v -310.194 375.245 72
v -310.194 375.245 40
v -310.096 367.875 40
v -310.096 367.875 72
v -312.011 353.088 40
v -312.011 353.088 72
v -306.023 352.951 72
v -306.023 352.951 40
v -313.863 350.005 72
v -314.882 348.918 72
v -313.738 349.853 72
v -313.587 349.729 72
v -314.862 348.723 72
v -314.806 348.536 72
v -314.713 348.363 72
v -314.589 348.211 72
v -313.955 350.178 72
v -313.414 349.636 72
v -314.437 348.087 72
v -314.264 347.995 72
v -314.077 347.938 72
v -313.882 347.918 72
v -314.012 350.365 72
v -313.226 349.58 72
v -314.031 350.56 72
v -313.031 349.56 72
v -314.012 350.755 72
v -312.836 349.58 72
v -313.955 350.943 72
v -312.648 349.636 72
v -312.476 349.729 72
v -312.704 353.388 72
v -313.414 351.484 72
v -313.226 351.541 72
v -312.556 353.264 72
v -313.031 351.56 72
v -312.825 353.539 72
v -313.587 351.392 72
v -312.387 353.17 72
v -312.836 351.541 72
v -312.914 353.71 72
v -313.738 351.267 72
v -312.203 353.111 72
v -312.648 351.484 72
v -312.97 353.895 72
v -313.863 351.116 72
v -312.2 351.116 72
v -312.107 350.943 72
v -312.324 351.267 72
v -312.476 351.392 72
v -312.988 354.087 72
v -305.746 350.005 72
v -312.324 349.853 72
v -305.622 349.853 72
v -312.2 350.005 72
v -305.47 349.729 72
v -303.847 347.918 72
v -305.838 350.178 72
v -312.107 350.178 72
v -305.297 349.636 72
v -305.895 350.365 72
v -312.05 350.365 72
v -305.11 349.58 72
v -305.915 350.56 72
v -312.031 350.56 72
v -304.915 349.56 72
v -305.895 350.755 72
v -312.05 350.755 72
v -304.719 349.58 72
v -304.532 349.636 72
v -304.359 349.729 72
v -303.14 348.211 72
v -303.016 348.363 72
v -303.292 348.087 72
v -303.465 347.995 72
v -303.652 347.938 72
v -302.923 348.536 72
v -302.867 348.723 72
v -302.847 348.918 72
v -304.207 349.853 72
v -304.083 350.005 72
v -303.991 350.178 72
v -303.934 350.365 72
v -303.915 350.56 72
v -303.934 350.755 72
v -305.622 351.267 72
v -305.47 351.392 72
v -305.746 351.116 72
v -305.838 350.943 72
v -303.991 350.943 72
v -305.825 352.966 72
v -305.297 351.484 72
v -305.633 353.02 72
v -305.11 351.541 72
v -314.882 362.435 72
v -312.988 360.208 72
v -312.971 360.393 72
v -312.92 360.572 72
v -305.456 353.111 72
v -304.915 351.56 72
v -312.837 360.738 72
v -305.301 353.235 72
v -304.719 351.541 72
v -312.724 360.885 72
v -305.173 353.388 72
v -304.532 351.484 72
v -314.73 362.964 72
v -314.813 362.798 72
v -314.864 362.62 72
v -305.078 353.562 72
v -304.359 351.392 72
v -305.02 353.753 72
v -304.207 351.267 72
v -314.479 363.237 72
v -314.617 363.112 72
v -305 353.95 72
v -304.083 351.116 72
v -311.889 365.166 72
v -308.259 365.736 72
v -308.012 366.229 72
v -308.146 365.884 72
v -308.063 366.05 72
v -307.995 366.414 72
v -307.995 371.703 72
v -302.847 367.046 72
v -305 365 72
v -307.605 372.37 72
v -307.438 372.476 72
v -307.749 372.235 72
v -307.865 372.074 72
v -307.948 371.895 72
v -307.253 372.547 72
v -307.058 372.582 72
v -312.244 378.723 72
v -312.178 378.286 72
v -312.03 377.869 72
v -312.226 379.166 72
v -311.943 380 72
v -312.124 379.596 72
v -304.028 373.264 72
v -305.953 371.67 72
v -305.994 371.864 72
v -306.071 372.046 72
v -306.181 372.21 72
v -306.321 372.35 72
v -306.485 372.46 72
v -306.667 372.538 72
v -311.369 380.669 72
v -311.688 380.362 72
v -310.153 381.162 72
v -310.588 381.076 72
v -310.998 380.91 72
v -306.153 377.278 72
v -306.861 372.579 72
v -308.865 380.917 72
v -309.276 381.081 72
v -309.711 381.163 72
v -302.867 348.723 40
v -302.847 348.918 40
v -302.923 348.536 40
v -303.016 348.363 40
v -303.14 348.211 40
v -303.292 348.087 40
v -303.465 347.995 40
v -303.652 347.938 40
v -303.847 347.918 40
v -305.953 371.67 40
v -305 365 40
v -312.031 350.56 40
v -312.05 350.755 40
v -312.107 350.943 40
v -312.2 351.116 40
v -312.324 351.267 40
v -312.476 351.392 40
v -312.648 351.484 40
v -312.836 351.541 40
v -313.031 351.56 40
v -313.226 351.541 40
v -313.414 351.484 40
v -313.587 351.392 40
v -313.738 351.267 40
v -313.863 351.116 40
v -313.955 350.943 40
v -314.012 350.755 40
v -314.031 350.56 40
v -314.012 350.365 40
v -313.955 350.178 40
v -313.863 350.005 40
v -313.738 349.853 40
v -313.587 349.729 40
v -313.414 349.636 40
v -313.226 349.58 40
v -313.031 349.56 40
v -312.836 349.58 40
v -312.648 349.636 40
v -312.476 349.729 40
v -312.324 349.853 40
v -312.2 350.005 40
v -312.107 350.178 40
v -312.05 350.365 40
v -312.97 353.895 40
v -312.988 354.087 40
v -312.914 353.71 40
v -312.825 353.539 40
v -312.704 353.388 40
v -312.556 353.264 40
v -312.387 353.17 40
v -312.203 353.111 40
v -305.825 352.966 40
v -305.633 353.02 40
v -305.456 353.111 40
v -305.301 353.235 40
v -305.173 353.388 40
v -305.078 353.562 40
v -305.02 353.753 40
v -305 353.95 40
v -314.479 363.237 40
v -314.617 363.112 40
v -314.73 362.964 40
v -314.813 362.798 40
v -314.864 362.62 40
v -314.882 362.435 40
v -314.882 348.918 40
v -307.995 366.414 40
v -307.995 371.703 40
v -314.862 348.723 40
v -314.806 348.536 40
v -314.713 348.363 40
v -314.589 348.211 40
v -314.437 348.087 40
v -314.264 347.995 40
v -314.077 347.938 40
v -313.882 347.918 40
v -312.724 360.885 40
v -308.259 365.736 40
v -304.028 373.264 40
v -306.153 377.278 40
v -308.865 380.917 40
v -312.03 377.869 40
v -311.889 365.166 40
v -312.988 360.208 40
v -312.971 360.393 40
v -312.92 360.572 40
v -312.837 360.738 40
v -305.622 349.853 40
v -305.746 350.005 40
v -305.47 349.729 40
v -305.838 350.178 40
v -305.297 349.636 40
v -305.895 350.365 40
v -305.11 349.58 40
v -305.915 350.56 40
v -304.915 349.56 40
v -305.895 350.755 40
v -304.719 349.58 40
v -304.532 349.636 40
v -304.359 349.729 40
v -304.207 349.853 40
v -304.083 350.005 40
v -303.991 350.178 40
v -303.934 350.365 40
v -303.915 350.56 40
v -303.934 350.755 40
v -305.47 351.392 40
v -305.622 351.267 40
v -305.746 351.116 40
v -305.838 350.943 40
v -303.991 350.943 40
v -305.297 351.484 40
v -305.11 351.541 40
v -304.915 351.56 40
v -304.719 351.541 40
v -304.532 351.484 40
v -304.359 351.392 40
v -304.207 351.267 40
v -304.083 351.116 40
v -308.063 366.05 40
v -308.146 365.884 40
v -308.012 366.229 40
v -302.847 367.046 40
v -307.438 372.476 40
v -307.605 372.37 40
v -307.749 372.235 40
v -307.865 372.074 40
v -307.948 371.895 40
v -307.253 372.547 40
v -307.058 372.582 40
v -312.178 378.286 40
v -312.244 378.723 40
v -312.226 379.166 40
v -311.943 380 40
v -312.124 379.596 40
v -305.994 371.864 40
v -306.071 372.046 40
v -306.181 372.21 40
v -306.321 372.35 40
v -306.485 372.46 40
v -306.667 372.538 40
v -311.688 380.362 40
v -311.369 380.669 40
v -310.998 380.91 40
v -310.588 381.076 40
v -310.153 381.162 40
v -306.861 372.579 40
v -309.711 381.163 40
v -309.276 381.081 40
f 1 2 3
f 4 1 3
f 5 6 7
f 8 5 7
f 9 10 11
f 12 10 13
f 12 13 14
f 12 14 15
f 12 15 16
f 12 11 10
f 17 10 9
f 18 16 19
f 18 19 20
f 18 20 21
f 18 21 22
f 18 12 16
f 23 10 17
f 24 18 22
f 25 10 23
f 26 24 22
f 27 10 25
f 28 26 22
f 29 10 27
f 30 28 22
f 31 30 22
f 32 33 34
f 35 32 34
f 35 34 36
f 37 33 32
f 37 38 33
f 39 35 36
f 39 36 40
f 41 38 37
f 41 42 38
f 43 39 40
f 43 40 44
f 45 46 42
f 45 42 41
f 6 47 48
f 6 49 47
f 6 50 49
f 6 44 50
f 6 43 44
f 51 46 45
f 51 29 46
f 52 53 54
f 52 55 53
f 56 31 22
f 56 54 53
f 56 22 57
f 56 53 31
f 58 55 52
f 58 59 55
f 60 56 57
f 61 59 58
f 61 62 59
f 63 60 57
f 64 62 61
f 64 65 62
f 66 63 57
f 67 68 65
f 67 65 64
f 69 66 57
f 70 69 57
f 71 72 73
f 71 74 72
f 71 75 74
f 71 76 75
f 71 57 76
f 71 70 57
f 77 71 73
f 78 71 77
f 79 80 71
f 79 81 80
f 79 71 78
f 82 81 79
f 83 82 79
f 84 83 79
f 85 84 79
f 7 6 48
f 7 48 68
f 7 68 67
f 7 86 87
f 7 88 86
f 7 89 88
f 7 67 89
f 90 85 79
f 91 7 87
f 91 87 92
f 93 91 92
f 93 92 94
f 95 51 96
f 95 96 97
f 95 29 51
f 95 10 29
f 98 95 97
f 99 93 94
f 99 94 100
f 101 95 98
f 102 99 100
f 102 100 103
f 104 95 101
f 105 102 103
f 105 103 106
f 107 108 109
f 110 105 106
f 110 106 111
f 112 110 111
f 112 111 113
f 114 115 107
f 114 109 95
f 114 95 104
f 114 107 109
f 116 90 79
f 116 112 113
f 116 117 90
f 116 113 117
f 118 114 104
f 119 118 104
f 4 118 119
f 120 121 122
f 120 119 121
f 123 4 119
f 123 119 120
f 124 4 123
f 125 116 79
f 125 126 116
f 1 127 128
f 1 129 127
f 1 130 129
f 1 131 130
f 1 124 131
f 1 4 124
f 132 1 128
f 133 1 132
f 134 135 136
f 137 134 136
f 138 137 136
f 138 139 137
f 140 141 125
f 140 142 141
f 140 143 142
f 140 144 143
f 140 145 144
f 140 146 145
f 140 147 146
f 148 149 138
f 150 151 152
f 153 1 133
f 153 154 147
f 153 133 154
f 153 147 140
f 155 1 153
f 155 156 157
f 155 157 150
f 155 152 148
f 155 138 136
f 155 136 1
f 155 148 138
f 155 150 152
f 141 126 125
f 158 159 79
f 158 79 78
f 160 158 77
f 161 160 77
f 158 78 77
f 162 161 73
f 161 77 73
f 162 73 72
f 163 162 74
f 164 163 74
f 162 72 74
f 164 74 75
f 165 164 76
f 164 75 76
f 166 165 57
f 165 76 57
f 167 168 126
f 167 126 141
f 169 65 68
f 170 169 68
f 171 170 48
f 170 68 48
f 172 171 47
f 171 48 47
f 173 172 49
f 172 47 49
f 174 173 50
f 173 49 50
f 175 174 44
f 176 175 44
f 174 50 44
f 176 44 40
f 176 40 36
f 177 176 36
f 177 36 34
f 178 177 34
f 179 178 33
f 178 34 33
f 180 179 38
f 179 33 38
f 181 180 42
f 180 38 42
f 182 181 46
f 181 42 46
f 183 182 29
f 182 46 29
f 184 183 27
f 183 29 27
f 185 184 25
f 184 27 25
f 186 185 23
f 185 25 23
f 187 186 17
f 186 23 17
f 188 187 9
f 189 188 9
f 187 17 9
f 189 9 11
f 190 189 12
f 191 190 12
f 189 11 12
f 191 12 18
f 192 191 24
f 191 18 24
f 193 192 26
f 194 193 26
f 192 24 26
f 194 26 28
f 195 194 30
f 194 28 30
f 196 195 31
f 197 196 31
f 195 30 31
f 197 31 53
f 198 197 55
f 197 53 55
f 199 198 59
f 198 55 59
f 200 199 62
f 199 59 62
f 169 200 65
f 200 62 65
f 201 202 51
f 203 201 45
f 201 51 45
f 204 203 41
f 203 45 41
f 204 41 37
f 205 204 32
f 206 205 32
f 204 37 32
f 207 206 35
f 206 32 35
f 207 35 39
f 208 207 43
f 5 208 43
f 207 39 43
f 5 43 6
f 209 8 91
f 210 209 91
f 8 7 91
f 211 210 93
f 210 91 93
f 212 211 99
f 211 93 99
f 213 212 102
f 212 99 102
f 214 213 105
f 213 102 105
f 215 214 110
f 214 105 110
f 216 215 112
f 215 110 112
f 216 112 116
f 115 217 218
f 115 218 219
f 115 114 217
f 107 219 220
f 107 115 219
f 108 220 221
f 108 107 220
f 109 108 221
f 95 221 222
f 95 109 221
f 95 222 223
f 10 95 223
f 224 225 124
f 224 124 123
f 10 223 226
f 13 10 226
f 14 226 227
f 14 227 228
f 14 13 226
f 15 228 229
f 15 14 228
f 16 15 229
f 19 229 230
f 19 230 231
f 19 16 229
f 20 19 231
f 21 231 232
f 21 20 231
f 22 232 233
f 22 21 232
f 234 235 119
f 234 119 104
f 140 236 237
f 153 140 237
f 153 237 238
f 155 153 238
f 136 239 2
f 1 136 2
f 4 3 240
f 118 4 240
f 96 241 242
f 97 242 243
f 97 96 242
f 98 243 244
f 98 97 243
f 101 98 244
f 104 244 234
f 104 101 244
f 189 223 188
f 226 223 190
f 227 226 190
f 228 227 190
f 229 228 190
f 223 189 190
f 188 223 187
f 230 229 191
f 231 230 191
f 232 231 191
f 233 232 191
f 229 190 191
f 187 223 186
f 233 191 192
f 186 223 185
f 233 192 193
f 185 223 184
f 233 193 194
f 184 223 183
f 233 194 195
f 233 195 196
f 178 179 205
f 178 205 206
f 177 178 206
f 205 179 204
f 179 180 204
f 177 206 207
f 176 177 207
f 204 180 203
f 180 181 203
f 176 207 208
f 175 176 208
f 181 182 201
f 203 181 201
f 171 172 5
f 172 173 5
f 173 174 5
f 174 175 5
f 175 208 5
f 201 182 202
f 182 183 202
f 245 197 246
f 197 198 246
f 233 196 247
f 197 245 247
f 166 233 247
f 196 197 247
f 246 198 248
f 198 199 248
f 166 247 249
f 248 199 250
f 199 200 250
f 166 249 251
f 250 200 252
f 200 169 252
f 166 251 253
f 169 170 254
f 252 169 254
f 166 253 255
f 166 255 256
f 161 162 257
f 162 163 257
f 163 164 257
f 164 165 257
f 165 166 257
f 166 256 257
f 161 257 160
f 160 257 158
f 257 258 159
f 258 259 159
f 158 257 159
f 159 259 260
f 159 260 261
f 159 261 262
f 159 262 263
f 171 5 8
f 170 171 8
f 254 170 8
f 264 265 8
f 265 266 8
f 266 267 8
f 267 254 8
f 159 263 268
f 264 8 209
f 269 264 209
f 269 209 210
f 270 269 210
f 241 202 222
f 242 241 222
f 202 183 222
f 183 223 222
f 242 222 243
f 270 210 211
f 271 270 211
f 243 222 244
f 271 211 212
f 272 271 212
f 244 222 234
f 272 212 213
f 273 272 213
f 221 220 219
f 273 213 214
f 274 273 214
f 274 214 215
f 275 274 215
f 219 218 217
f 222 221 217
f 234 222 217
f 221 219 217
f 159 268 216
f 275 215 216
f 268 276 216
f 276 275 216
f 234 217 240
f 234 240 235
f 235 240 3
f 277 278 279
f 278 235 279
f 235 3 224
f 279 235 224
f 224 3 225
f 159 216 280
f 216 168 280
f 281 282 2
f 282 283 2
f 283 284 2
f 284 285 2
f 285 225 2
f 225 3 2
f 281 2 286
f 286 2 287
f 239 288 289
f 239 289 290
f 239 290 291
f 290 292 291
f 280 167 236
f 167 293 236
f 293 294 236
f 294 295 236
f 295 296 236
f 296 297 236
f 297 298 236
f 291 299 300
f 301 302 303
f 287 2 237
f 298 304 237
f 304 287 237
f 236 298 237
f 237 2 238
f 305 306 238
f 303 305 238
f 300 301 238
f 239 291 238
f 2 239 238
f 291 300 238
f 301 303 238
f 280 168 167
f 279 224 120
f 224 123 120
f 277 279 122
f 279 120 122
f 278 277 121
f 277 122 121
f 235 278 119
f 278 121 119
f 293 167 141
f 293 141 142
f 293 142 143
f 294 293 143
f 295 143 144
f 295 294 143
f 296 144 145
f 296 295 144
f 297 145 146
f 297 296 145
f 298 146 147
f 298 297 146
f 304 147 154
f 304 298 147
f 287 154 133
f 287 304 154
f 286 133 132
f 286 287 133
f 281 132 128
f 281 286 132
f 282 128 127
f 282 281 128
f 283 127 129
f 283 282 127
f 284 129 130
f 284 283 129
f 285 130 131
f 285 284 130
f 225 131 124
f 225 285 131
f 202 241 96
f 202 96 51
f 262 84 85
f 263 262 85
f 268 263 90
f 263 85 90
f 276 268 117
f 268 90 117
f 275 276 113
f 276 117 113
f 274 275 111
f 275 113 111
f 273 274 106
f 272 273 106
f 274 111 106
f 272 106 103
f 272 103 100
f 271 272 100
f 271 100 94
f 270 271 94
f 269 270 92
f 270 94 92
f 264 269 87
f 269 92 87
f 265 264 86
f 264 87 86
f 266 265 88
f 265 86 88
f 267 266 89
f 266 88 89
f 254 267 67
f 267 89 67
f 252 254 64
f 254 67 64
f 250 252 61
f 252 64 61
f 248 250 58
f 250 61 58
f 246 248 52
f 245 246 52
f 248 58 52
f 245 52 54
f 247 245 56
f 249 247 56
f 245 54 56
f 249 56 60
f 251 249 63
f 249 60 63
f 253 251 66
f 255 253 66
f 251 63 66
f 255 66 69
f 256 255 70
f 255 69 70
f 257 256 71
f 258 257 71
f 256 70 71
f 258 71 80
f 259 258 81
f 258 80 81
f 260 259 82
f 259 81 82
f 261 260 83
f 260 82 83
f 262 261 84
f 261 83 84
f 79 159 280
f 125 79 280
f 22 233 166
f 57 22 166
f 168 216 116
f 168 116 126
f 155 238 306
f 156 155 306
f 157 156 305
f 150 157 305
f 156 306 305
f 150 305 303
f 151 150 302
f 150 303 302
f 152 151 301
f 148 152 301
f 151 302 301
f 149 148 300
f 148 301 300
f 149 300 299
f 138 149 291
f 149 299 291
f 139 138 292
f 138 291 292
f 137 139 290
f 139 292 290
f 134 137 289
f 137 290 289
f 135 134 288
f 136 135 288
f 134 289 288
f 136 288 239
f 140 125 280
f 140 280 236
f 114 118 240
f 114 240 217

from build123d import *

# Parameters (mm, degrees)
BOSS_EXTRUDE1_DEPTH = 32
FILLET1_R           = 1
SKETCH2_R           = 1
CUT_EXTRUDE1_DEPTH  = 32


with BuildPart() as part:
    # Sketch1 → Boss-Extrude1 (new body)
    with BuildSketch(Plane.XY.offset(40)):
        with BuildLine():
            Line((-312.030492528, 377.868524993), (-310.193868717, 375.244776692))
            Line((-310.193868717, 375.244776692), (-310.096008301, 367.875213623))
            Line((-310.096008301, 367.875213623), (-311.889068604, 365.166412354))
            Line((-311.889068604, 365.166412354), (-314.88168335, 362.936676025))
            Line((-314.88168335, 362.936676025), (-314.88168335, 347.918438133))
            Line((-314.88168335, 347.918438133), (-302.847373473, 347.918438133))
            Line((-302.847373473, 347.918438133), (-302.847373473, 367.04556325))
            Line((-302.847373473, 367.04556325), (-304.028060208, 373.263846724))
            Line((-304.028060208, 373.263846724), (-306.153296332, 377.278181625))
            Line((-306.153296332, 377.278181625), (-308.864528411, 380.917030307))
            ThreePointArc((-308.864528411, 380.917030307), (-311.535911341, 380.523114569), (-312.030492528, 377.868524993))
        make_face()
        with BuildLine():
            Line((-312.988408734, 360.598376943), (-312.988408734, 353.109979303))
            Line((-312.988408734, 353.109979303), (-305, 352.927314193))
            Line((-305, 352.927314193), (-305, 365))
            Line((-305, 365), (-305.952850342, 371.670013428))
            ThreePointArc((-305.952850342, 371.670013428), (-306.959348498, 372.584855641), (-307.99460106, 371.702683918))
            Line((-307.99460106, 371.702683918), (-307.99460106, 366.023339102))
            Line((-307.99460106, 366.023339102), (-312.988408734, 360.598376943))
        make_face(mode=Mode.SUBTRACT)
    extrude(amount=BOSS_EXTRUDE1_DEPTH)

    # Fillet1
    fillet1_edges = [part.edges().sort_by_distance(p)[0] for p in [
        (-302.847373473, 347.918438133, 56),
        (-314.88168335, 347.918438133, 56),
        (-314.88168335, 362.936676025, 56),
        (-307.99460106, 366.023339102, 56),
        (-312.988408734, 360.598376943, 56),
        (-312.988408734, 353.109979303, 56),
        (-305, 352.927314193, 56),
    ]]
    fillet(fillet1_edges, radius=FILLET1_R)

    # Sketch2 → Cut-Extrude1 (cut)
    with BuildSketch(Plane.XY.offset(72)):
        with Locations((-313.031111026, 350.560286037)):
            Circle(SKETCH2_R)
        with Locations((-304.91451991, 350.560286037)):
            Circle(SKETCH2_R)
    extrude(amount=-CUT_EXTRUDE1_DEPTH, mode=Mode.SUBTRACT)


solid = part.part
